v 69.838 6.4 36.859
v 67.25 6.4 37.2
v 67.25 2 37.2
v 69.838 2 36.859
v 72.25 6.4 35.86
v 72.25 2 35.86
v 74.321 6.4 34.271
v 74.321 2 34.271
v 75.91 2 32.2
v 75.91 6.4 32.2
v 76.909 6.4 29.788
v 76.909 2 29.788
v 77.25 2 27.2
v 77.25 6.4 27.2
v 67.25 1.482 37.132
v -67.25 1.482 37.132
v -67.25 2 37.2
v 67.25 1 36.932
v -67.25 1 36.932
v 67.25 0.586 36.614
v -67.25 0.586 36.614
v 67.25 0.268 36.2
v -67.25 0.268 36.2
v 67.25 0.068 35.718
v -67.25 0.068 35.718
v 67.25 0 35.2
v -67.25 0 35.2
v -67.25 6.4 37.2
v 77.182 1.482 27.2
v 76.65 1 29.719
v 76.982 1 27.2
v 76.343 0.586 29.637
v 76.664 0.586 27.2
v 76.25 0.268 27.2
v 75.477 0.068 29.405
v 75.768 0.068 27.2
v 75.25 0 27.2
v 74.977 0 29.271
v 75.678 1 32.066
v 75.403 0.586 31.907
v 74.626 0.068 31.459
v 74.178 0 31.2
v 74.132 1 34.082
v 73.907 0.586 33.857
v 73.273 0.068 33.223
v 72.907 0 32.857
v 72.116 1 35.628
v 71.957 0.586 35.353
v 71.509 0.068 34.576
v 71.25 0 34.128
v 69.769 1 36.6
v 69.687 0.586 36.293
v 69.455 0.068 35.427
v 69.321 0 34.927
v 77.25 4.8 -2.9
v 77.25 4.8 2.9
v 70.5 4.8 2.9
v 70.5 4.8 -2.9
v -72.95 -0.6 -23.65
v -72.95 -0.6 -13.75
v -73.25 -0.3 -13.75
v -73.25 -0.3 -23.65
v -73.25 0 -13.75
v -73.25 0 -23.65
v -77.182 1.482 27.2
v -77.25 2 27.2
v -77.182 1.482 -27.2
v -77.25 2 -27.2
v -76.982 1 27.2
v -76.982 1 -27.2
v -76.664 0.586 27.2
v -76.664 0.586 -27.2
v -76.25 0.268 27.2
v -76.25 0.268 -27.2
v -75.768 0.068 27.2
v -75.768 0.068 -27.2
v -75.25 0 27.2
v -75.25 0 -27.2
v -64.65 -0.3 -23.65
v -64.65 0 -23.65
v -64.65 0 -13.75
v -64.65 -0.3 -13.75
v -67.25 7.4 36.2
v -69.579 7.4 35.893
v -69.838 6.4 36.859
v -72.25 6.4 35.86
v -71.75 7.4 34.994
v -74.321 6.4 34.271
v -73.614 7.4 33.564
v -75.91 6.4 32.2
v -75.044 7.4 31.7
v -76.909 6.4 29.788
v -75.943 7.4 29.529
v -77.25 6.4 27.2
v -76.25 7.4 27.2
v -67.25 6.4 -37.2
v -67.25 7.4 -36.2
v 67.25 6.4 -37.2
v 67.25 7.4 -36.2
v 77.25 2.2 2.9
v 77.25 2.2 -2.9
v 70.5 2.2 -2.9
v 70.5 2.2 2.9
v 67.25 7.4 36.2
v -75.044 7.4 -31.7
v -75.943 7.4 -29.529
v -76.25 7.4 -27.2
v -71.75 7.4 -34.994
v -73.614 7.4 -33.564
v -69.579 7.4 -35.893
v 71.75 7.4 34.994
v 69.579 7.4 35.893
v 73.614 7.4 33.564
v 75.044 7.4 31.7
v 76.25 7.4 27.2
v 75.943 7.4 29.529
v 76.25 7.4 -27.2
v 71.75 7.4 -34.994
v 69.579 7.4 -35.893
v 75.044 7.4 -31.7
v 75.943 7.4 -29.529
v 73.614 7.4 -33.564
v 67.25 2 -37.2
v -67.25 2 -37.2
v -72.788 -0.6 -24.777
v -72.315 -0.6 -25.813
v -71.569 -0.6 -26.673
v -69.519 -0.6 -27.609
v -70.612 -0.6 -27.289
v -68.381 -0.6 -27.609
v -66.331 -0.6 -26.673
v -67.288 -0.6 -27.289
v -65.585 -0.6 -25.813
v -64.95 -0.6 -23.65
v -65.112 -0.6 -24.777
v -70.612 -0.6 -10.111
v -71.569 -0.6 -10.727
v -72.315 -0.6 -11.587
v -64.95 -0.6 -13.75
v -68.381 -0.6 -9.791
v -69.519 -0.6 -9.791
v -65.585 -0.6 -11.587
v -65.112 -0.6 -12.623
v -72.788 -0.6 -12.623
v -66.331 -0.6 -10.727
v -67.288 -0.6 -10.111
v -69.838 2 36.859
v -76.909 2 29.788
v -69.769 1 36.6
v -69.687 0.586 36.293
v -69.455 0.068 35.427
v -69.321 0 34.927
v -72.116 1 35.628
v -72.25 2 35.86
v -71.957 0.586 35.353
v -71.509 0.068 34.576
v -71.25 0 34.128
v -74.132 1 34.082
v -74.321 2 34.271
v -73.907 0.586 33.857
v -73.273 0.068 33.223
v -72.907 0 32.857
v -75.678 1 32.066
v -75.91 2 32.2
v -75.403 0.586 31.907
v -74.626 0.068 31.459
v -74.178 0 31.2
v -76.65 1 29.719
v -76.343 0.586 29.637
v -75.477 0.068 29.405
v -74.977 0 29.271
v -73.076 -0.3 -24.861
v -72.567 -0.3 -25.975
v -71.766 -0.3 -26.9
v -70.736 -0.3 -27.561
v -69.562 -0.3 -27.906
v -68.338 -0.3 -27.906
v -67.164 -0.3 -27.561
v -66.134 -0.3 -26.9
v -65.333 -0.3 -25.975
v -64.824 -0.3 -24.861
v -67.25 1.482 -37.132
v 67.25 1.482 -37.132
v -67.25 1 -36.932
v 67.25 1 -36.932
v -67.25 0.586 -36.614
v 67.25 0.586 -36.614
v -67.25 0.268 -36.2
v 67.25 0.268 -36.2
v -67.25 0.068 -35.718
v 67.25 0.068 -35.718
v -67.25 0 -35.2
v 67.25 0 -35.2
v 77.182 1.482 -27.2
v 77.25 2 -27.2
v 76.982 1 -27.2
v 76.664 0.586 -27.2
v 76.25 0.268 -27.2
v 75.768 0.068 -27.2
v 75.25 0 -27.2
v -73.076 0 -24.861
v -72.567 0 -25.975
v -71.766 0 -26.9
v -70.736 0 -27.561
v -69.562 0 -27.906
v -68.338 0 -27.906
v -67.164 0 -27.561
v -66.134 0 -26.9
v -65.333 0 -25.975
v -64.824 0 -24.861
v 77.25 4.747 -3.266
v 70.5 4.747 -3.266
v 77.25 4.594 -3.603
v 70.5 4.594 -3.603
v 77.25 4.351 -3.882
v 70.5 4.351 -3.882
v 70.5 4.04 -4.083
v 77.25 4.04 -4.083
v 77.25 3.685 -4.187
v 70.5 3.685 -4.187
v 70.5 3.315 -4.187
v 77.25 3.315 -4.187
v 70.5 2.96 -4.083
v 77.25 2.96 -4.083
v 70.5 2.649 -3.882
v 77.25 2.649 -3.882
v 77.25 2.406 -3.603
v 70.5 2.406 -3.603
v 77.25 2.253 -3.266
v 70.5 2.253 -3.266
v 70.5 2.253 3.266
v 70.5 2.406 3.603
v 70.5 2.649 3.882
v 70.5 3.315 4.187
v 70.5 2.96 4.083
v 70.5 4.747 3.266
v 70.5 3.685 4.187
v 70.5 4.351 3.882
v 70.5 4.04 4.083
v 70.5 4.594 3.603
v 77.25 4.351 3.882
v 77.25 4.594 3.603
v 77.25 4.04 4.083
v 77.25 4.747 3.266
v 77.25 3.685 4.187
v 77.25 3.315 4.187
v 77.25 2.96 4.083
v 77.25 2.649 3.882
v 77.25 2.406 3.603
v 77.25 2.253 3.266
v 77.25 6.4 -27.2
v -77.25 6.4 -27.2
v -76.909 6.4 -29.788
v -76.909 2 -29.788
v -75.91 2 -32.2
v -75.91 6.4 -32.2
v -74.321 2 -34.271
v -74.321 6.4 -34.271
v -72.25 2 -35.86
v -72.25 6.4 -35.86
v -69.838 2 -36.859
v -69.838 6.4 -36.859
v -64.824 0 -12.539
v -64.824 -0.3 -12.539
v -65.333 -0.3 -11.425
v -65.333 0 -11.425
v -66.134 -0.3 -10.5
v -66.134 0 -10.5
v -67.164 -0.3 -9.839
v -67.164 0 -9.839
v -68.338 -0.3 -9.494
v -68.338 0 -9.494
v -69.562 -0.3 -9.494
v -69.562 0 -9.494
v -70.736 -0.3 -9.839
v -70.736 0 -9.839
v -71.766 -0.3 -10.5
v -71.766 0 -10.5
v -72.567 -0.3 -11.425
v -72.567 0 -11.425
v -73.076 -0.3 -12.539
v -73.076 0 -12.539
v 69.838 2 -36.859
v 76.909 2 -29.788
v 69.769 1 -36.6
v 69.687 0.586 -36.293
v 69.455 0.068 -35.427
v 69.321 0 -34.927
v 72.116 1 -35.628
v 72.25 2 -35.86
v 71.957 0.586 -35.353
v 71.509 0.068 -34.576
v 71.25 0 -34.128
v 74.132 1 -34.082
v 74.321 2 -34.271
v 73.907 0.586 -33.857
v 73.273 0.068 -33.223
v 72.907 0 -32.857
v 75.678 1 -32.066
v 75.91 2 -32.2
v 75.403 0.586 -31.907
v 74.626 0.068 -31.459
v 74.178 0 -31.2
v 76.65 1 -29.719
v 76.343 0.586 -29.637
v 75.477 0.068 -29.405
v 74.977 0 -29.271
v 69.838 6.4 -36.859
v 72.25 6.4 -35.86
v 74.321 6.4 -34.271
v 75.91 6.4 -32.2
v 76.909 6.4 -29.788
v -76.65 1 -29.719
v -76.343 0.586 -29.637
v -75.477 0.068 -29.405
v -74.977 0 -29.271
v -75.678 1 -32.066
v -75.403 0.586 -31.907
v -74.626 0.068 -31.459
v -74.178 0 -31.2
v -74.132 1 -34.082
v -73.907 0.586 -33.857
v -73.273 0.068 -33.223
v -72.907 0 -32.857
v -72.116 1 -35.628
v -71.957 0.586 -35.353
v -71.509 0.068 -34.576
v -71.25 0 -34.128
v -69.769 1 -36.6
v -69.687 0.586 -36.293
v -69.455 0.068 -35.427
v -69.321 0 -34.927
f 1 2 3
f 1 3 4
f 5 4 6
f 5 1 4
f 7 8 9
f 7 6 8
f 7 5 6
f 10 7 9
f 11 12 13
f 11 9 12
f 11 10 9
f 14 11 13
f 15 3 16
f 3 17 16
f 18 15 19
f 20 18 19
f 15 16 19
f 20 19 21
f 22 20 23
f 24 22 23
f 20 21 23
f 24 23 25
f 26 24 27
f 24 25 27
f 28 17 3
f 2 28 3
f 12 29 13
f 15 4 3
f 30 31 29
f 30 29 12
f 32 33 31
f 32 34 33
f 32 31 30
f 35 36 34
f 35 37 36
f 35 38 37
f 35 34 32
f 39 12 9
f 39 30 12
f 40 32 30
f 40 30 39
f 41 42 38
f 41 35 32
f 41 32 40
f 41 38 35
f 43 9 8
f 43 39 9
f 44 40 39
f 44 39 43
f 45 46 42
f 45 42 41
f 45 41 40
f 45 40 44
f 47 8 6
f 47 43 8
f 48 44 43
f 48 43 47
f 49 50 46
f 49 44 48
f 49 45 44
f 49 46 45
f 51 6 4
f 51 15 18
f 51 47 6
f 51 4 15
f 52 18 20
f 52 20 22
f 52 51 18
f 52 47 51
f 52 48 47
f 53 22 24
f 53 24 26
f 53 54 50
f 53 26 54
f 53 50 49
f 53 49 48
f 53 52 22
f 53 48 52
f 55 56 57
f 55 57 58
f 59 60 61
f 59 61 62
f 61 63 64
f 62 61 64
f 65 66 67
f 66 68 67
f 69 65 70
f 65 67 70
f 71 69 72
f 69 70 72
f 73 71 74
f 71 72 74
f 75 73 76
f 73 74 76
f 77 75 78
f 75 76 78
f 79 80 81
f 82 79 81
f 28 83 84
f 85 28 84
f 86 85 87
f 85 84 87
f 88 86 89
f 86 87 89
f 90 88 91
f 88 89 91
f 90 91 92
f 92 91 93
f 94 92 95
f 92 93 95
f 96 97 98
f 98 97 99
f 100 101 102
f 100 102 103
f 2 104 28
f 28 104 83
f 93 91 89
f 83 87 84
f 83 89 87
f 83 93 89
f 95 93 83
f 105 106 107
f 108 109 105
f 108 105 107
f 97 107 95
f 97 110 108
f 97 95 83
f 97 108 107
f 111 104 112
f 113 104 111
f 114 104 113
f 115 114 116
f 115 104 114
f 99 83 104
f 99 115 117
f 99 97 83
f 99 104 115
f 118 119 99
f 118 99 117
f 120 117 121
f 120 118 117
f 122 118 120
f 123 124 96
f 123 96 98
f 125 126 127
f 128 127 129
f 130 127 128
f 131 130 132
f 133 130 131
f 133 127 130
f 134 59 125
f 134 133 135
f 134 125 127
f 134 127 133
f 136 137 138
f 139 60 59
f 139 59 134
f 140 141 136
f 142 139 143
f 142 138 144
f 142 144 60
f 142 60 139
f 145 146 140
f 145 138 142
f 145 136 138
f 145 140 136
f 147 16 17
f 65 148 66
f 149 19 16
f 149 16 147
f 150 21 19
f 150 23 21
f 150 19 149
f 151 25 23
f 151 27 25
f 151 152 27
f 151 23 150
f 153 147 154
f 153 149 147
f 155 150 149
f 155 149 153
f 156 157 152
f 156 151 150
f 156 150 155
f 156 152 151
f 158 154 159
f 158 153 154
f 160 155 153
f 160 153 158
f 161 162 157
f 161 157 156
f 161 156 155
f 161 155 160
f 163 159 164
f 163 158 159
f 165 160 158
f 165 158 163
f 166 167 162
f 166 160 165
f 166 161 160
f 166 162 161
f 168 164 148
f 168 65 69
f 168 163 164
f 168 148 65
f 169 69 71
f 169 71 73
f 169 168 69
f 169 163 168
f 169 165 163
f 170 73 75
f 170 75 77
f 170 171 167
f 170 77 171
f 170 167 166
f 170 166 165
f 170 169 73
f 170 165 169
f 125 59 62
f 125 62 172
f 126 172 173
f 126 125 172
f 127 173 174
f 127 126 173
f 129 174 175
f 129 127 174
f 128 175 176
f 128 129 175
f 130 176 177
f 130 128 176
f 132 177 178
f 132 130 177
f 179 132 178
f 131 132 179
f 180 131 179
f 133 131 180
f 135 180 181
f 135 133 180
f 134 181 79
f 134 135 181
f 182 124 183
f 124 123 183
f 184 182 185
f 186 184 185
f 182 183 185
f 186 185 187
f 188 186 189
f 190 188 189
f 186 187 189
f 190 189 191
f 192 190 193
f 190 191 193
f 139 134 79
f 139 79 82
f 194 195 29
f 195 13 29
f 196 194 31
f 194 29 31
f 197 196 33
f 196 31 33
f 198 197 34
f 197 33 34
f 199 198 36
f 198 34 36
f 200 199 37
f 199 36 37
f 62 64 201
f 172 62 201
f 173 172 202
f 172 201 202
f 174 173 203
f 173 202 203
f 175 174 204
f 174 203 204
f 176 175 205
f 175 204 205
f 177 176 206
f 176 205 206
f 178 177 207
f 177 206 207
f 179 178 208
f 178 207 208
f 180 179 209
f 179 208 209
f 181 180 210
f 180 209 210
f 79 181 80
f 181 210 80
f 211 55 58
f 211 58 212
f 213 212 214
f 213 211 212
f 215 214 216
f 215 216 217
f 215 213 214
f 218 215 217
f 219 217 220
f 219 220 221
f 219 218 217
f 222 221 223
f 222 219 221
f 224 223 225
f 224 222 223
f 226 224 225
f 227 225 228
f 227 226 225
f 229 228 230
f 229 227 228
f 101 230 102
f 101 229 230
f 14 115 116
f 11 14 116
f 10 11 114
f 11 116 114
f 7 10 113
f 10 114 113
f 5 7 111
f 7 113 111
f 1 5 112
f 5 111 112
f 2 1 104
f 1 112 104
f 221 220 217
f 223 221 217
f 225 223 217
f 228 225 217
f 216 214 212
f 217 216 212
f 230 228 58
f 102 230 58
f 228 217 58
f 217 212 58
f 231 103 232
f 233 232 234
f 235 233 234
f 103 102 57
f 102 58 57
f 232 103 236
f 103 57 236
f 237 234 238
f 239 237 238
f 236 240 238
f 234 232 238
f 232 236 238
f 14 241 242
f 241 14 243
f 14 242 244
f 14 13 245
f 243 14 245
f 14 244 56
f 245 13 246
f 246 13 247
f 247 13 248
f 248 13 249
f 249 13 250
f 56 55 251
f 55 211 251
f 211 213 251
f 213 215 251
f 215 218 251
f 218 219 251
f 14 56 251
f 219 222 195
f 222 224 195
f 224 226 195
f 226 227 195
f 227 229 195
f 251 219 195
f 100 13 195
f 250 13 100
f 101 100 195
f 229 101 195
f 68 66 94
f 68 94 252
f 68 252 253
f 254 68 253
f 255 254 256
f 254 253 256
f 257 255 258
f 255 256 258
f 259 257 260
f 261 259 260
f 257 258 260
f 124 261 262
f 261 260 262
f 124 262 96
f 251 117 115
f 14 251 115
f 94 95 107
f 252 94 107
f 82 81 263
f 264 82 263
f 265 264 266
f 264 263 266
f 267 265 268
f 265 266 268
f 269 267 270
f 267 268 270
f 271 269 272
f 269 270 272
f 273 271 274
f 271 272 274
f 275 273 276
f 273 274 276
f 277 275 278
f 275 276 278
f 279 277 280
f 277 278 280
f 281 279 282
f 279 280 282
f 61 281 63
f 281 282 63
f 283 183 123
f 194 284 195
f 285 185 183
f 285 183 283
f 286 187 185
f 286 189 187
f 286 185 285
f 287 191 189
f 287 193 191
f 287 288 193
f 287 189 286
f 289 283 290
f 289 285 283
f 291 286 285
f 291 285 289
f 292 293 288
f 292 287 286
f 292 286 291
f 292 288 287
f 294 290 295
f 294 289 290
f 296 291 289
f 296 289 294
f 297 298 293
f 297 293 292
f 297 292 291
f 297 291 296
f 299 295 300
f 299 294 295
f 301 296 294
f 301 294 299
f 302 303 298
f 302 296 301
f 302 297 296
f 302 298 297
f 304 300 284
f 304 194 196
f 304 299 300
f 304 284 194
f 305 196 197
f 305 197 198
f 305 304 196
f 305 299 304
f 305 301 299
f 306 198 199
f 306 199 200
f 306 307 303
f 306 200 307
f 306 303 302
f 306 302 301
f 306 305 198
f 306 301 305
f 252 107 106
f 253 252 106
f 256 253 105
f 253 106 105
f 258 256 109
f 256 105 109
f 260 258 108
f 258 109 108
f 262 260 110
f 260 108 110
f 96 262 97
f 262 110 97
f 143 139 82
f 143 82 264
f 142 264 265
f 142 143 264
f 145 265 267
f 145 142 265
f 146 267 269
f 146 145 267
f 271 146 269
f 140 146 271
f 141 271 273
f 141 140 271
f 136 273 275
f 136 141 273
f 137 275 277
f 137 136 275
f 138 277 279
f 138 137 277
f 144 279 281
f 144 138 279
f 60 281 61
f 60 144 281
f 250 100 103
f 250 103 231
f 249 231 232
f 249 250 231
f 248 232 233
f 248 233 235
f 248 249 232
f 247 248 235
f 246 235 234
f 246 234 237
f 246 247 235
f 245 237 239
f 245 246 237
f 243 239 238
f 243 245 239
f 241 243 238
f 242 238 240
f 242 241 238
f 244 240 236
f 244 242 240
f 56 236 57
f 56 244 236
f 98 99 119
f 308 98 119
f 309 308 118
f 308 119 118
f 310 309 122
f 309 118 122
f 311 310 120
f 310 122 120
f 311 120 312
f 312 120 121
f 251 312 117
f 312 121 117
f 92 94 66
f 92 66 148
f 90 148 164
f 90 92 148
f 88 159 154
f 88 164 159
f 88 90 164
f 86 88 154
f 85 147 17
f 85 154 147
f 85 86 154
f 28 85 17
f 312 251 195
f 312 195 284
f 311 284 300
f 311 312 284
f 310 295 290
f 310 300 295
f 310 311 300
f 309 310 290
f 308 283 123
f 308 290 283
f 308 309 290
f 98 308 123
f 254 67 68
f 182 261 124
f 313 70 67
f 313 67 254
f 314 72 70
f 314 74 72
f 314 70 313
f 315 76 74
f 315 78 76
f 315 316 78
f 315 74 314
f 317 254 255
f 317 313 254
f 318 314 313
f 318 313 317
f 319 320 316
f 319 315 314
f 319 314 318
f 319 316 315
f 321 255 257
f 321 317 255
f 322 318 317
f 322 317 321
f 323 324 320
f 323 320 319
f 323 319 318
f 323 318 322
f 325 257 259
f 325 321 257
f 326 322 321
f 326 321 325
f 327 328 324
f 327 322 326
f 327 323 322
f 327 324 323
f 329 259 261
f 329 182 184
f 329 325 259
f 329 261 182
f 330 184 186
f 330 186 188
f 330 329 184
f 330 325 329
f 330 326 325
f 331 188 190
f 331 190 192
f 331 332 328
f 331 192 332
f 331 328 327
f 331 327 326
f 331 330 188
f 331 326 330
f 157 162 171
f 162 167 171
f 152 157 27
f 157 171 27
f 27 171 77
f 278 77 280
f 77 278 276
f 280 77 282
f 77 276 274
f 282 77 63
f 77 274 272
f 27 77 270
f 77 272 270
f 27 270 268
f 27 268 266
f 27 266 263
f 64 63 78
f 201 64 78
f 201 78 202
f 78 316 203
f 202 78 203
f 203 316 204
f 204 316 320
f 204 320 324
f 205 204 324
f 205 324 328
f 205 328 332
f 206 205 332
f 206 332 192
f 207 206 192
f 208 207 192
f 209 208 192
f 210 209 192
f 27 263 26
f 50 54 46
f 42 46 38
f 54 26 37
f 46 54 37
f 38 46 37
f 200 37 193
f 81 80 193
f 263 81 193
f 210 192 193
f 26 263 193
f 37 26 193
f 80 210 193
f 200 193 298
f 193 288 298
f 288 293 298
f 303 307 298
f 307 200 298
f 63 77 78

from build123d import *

# Parameters (mm, degrees)
SKETCH1_W           = 154.5
SKETCH1_H           = 74.4
BOSS_EXTRUDE1_DEPTH = 7.4
FILLET1_R           = 10
CHAMFER1_SIZE       = 1
FILLET2_R           = 2
SKETCH2_R           = 4.3
BOSS_EXTRUDE2_DEPTH = 0.6
CHAMFER2_SIZE       = 0.3
CUT_EXTRUDE1_DEPTH  = 6.75


with BuildPart() as part:
    # Sketch1 → Boss-Extrude1 (new body)
    with BuildSketch(Plane(origin=(0, 0, 0), x_dir=(1, 0, 0), z_dir=(0, 1, 0))):
        Rectangle(SKETCH1_W, SKETCH1_H)
    extrude(amount=BOSS_EXTRUDE1_DEPTH)

    # Fillet1
    fillet1_edges = [part.edges().sort_by_distance(p)[0] for p in [
        (77.25, 3.7, 37.2),
        (-77.25, 3.7, 37.2),
        (-77.25, 3.7, -37.2),
        (77.25, 3.7, -37.2),
    ]]
    fillet(fillet1_edges, radius=FILLET1_R)

    # Chamfer1
    chamfer1_edges = [part.edges().sort_by_distance(p)[0] for p in [
        (-77.25, 7.4, 0),
        (0, 7.4, -37.2),
        (77.25, 7.4, 0),
        (0, 7.4, 37.2),
        (74.321067812, 7.4, 34.271067812),
        (-74.321067812, 7.4, 34.271067812),
        (74.321067812, 7.4, -34.271067812),
        (-74.321067812, 7.4, -34.271067812),
    ]]
    chamfer(chamfer1_edges, length=CHAMFER1_SIZE)

    # Fillet2
    fillet2_edges = [part.edges().sort_by_distance(p)[0] for p in [
        (-77.25, 0, 0),
        (77.25, 0, 0),
        (0, 0, 37.2),
        (0, 0, -37.2),
        (74.321067812, 0, 34.271067812),
        (-74.321067812, 0, 34.271067812),
        (74.321067812, 0, -34.271067812),
        (-74.321067812, 0, -34.271067812),
    ]]
    fillet(fillet2_edges, radius=FILLET2_R)

    # Sketch2 → Boss-Extrude2 (add)
    with BuildSketch(Plane.XZ):
        with Locations((-68.95, -13.75)):
            Circle(SKETCH2_R)
        with BuildLine():
            Line((-73.25, -13.75), (-73.25, -23.65))
            ThreePointArc((-73.25, -23.65), (-68.95, -19.35), (-64.65, -23.65))
            Line((-64.65, -23.65), (-64.65, -13.75))
            ThreePointArc((-64.65, -13.75), (-68.95, -18.05), (-73.25, -13.75))
        make_face()
        with Locations((-68.95, -23.65)):
            Circle(SKETCH2_R)
    extrude(amount=BOSS_EXTRUDE2_DEPTH)

    # Chamfer2
    chamfer2_edges = [part.edges().sort_by_distance(p)[0] for p in [
        (-64.65, -0.6, -18.7),
        (-73.25, -0.6, -18.7),
        (-68.95, -0.6, -9.45),
        (-68.95, -0.6, -27.95),
    ]]
    chamfer(chamfer2_edges, length=CHAMFER2_SIZE)

    # Sketch3 → Cut-Extrude1 (cut)
    with BuildSketch(Plane(origin=(77.25, 0, 0), x_dir=(0, 0, -1), z_dir=(1, 0, 0))):
        with BuildLine():
            Line((-2.9, 4.8), (2.9, 4.8))
            ThreePointArc((2.9, 4.8), (4.2, 3.5), (2.9, 2.2))
            Line((2.9, 2.2), (-2.9, 2.2))
            ThreePointArc((-2.9, 2.2), (-4.2, 3.5), (-2.9, 4.8))
        make_face()
    extrude(amount=-CUT_EXTRUDE1_DEPTH, mode=Mode.SUBTRACT)


solid = part.part
